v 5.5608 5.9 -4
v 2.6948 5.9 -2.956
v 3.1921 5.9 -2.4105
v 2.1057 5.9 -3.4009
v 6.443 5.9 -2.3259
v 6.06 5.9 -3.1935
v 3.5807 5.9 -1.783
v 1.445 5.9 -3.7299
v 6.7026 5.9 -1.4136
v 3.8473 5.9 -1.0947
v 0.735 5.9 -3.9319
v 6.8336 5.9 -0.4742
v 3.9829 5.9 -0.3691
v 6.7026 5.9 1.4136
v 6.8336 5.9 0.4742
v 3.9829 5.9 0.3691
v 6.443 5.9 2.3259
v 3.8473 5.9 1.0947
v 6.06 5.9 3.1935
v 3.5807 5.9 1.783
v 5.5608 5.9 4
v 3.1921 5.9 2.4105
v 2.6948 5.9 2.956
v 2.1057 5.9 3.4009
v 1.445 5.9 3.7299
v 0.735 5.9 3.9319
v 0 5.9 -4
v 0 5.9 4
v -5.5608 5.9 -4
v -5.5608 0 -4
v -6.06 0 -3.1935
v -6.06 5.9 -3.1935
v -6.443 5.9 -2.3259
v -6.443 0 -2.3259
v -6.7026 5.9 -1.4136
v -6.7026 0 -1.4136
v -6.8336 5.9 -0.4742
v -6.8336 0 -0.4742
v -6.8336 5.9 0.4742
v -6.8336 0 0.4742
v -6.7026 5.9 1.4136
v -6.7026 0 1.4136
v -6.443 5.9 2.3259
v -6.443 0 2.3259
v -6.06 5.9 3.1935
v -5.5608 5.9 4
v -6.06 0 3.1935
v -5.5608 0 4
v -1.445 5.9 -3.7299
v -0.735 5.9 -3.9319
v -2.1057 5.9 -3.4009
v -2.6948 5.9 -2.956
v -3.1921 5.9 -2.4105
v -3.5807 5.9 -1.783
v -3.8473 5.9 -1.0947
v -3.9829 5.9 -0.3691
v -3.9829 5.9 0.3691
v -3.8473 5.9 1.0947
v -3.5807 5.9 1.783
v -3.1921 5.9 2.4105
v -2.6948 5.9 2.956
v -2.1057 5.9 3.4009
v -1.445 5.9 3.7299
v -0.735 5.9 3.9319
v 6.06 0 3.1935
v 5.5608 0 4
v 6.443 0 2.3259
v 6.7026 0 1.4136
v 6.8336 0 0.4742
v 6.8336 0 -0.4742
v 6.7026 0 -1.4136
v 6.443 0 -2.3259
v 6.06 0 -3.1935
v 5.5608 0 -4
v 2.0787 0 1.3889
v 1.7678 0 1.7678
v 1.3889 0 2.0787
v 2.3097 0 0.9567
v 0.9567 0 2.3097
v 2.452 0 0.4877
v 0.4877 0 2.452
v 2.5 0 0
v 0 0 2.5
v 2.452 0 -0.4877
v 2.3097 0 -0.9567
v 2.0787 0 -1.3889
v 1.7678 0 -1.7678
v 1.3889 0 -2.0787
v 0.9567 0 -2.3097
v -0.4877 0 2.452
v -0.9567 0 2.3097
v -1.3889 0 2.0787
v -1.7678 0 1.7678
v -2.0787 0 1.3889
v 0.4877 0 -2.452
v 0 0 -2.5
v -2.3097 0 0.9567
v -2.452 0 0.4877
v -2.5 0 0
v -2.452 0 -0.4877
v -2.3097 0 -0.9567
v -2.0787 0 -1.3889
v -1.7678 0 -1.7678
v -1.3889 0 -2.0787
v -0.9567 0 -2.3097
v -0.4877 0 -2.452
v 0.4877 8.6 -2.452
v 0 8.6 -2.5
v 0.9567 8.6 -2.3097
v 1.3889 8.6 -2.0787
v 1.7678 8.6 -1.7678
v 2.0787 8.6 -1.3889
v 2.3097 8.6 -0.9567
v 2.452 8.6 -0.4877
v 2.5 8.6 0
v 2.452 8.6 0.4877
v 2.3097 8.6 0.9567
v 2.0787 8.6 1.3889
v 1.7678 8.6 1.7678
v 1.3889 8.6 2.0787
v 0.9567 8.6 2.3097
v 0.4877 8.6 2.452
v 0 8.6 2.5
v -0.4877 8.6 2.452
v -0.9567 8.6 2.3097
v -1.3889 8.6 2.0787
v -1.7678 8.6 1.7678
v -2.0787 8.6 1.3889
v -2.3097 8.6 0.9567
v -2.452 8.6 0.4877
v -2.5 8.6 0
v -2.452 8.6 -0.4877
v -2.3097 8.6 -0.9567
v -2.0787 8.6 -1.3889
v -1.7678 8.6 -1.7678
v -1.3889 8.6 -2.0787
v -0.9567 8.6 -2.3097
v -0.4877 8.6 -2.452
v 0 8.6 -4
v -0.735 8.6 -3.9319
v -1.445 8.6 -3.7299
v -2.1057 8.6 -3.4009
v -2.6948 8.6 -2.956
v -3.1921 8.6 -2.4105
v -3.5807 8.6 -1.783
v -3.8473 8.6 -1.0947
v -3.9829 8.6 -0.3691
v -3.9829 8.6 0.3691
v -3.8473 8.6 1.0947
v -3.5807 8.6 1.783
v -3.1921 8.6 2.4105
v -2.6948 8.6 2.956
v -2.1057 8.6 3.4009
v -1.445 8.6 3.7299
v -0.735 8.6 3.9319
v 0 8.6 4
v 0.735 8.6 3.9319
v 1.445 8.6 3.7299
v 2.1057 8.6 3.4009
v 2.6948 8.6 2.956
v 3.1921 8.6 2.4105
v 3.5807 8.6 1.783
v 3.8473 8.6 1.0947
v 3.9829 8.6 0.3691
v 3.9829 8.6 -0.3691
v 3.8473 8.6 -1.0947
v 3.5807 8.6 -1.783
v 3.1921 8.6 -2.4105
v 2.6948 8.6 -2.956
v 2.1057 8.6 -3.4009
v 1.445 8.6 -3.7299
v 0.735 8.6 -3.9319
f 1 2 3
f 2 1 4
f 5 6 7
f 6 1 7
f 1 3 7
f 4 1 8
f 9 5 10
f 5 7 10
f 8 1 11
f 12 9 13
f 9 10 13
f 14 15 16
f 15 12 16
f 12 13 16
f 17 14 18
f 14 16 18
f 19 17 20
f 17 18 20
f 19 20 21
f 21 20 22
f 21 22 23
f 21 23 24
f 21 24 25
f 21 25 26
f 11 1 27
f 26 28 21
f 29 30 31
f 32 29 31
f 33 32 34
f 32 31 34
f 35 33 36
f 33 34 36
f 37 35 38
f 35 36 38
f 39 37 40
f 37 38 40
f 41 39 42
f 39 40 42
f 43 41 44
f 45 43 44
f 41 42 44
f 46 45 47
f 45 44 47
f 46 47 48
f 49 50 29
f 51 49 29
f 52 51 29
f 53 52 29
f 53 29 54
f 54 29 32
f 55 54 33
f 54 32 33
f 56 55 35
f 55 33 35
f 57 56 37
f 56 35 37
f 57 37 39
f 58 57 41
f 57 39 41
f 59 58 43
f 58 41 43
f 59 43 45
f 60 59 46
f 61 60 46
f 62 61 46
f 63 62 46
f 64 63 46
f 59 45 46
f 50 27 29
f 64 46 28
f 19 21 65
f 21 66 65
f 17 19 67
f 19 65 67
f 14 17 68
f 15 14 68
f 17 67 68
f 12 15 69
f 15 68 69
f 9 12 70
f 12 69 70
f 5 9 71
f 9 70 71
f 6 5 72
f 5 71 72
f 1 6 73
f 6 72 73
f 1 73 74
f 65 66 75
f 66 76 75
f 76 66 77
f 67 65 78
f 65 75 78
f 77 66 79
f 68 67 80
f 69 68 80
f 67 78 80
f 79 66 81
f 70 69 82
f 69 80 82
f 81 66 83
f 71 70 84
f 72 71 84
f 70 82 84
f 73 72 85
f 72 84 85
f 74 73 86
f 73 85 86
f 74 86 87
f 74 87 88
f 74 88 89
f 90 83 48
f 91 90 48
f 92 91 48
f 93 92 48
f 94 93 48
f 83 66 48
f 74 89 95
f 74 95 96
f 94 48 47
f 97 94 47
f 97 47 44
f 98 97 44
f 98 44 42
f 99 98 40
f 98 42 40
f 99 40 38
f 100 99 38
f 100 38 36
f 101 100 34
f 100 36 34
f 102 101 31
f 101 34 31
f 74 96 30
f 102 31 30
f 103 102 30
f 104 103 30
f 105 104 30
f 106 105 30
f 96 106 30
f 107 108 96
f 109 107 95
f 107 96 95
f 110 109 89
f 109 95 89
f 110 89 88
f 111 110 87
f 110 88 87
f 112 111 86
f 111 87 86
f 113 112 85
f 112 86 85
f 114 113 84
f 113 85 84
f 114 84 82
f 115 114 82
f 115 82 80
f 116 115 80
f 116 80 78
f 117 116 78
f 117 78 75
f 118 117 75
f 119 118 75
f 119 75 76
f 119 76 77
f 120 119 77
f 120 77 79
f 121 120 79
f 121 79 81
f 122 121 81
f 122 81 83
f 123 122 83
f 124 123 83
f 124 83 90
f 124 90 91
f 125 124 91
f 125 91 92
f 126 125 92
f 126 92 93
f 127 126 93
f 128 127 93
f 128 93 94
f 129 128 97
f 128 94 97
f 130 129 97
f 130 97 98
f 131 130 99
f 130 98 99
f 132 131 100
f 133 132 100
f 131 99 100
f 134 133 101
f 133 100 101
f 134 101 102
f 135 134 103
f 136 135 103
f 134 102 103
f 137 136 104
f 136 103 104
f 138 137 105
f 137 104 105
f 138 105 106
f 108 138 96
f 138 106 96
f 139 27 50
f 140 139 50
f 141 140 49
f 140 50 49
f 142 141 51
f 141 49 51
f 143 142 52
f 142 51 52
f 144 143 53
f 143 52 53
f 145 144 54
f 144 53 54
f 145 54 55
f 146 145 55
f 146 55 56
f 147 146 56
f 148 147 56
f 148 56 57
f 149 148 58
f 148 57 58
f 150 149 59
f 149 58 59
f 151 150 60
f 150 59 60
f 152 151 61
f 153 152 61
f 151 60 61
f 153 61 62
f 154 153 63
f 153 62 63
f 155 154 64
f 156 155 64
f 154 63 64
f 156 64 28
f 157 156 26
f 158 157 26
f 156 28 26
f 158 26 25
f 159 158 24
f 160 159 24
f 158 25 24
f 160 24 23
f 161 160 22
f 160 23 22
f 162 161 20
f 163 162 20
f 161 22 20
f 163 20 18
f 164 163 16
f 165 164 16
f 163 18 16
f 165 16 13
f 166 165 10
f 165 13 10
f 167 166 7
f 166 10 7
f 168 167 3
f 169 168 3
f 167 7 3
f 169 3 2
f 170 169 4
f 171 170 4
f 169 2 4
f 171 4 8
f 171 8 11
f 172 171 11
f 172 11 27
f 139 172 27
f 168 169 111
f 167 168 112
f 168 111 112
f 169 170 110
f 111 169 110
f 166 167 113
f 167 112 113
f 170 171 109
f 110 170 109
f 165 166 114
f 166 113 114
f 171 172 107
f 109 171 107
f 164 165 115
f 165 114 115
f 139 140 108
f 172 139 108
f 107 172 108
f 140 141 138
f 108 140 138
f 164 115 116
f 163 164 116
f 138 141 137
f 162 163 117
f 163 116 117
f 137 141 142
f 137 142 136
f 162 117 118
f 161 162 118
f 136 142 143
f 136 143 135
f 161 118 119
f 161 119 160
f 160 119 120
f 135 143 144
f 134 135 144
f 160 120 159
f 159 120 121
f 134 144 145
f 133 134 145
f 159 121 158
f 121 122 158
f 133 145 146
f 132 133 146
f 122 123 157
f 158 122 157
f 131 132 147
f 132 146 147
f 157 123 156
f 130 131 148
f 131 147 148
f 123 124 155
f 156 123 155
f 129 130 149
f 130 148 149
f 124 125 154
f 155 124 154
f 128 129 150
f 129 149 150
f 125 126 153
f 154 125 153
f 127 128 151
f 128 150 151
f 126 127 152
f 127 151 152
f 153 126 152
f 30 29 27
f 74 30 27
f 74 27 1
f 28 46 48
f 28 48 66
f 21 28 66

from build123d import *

# Parameters (mm, degrees)
SKETCH_6_W             = 19.342786847
SKETCH_6_H             = 6.481709878
CUT_EXTRUDE_2_DEPTH    = 12.342618745
HOLE_WIZARD_M6_1_D     = 5
HOLE_WIZARD_M6_1_DEPTH = 28
HOLE_WIZARD_M6_1_TIP   = 1.502151548


with BuildPart() as part:
    # 草图4 → 旋转2 (revolve)
    with BuildSketch(Plane.XY, mode=Mode.PRIVATE) as revolve_2_sk:
        Polygon((0, 0), (0, 8.6), (4, 8.6), (4, 5.9), (6.85, 5.9), (6.85, 0), align=None)
    revolve(revolve_2_sk.sketch.rotate(Axis((0, 0, 0), (0, 1, 0)), 90), axis=Axis((0, 0, 0), (0, 1, 0)))

    # 草图6 → 切除-拉伸2 (cut, through all)
    with BuildSketch(Plane(origin=(0, 5.9, 0), x_dir=(1, 0, 0), z_dir=(0, 1, 0))):
        with Locations((-1.599688833, 7.240854939)):
            Rectangle(SKETCH_6_W, SKETCH_6_H)
        with Locations((-1.599688833, -7.240854939)):
            Rectangle(SKETCH_6_W, SKETCH_6_H)
    extrude(amount=-CUT_EXTRUDE_2_DEPTH, mode=Mode.SUBTRACT)

    # M6 螺纹孔1
    with Locations(Plane.ZX.offset(8.6)):
        with Locations((0, 0)):
            Hole(HOLE_WIZARD_M6_1_D / 2, depth=HOLE_WIZARD_M6_1_DEPTH)
            with Locations((0, 0, -(HOLE_WIZARD_M6_1_DEPTH + HOLE_WIZARD_M6_1_TIP / 2))):  # 118° drill point
                Cone(0, HOLE_WIZARD_M6_1_D / 2, HOLE_WIZARD_M6_1_TIP, mode=Mode.SUBTRACT)


solid = part.part
